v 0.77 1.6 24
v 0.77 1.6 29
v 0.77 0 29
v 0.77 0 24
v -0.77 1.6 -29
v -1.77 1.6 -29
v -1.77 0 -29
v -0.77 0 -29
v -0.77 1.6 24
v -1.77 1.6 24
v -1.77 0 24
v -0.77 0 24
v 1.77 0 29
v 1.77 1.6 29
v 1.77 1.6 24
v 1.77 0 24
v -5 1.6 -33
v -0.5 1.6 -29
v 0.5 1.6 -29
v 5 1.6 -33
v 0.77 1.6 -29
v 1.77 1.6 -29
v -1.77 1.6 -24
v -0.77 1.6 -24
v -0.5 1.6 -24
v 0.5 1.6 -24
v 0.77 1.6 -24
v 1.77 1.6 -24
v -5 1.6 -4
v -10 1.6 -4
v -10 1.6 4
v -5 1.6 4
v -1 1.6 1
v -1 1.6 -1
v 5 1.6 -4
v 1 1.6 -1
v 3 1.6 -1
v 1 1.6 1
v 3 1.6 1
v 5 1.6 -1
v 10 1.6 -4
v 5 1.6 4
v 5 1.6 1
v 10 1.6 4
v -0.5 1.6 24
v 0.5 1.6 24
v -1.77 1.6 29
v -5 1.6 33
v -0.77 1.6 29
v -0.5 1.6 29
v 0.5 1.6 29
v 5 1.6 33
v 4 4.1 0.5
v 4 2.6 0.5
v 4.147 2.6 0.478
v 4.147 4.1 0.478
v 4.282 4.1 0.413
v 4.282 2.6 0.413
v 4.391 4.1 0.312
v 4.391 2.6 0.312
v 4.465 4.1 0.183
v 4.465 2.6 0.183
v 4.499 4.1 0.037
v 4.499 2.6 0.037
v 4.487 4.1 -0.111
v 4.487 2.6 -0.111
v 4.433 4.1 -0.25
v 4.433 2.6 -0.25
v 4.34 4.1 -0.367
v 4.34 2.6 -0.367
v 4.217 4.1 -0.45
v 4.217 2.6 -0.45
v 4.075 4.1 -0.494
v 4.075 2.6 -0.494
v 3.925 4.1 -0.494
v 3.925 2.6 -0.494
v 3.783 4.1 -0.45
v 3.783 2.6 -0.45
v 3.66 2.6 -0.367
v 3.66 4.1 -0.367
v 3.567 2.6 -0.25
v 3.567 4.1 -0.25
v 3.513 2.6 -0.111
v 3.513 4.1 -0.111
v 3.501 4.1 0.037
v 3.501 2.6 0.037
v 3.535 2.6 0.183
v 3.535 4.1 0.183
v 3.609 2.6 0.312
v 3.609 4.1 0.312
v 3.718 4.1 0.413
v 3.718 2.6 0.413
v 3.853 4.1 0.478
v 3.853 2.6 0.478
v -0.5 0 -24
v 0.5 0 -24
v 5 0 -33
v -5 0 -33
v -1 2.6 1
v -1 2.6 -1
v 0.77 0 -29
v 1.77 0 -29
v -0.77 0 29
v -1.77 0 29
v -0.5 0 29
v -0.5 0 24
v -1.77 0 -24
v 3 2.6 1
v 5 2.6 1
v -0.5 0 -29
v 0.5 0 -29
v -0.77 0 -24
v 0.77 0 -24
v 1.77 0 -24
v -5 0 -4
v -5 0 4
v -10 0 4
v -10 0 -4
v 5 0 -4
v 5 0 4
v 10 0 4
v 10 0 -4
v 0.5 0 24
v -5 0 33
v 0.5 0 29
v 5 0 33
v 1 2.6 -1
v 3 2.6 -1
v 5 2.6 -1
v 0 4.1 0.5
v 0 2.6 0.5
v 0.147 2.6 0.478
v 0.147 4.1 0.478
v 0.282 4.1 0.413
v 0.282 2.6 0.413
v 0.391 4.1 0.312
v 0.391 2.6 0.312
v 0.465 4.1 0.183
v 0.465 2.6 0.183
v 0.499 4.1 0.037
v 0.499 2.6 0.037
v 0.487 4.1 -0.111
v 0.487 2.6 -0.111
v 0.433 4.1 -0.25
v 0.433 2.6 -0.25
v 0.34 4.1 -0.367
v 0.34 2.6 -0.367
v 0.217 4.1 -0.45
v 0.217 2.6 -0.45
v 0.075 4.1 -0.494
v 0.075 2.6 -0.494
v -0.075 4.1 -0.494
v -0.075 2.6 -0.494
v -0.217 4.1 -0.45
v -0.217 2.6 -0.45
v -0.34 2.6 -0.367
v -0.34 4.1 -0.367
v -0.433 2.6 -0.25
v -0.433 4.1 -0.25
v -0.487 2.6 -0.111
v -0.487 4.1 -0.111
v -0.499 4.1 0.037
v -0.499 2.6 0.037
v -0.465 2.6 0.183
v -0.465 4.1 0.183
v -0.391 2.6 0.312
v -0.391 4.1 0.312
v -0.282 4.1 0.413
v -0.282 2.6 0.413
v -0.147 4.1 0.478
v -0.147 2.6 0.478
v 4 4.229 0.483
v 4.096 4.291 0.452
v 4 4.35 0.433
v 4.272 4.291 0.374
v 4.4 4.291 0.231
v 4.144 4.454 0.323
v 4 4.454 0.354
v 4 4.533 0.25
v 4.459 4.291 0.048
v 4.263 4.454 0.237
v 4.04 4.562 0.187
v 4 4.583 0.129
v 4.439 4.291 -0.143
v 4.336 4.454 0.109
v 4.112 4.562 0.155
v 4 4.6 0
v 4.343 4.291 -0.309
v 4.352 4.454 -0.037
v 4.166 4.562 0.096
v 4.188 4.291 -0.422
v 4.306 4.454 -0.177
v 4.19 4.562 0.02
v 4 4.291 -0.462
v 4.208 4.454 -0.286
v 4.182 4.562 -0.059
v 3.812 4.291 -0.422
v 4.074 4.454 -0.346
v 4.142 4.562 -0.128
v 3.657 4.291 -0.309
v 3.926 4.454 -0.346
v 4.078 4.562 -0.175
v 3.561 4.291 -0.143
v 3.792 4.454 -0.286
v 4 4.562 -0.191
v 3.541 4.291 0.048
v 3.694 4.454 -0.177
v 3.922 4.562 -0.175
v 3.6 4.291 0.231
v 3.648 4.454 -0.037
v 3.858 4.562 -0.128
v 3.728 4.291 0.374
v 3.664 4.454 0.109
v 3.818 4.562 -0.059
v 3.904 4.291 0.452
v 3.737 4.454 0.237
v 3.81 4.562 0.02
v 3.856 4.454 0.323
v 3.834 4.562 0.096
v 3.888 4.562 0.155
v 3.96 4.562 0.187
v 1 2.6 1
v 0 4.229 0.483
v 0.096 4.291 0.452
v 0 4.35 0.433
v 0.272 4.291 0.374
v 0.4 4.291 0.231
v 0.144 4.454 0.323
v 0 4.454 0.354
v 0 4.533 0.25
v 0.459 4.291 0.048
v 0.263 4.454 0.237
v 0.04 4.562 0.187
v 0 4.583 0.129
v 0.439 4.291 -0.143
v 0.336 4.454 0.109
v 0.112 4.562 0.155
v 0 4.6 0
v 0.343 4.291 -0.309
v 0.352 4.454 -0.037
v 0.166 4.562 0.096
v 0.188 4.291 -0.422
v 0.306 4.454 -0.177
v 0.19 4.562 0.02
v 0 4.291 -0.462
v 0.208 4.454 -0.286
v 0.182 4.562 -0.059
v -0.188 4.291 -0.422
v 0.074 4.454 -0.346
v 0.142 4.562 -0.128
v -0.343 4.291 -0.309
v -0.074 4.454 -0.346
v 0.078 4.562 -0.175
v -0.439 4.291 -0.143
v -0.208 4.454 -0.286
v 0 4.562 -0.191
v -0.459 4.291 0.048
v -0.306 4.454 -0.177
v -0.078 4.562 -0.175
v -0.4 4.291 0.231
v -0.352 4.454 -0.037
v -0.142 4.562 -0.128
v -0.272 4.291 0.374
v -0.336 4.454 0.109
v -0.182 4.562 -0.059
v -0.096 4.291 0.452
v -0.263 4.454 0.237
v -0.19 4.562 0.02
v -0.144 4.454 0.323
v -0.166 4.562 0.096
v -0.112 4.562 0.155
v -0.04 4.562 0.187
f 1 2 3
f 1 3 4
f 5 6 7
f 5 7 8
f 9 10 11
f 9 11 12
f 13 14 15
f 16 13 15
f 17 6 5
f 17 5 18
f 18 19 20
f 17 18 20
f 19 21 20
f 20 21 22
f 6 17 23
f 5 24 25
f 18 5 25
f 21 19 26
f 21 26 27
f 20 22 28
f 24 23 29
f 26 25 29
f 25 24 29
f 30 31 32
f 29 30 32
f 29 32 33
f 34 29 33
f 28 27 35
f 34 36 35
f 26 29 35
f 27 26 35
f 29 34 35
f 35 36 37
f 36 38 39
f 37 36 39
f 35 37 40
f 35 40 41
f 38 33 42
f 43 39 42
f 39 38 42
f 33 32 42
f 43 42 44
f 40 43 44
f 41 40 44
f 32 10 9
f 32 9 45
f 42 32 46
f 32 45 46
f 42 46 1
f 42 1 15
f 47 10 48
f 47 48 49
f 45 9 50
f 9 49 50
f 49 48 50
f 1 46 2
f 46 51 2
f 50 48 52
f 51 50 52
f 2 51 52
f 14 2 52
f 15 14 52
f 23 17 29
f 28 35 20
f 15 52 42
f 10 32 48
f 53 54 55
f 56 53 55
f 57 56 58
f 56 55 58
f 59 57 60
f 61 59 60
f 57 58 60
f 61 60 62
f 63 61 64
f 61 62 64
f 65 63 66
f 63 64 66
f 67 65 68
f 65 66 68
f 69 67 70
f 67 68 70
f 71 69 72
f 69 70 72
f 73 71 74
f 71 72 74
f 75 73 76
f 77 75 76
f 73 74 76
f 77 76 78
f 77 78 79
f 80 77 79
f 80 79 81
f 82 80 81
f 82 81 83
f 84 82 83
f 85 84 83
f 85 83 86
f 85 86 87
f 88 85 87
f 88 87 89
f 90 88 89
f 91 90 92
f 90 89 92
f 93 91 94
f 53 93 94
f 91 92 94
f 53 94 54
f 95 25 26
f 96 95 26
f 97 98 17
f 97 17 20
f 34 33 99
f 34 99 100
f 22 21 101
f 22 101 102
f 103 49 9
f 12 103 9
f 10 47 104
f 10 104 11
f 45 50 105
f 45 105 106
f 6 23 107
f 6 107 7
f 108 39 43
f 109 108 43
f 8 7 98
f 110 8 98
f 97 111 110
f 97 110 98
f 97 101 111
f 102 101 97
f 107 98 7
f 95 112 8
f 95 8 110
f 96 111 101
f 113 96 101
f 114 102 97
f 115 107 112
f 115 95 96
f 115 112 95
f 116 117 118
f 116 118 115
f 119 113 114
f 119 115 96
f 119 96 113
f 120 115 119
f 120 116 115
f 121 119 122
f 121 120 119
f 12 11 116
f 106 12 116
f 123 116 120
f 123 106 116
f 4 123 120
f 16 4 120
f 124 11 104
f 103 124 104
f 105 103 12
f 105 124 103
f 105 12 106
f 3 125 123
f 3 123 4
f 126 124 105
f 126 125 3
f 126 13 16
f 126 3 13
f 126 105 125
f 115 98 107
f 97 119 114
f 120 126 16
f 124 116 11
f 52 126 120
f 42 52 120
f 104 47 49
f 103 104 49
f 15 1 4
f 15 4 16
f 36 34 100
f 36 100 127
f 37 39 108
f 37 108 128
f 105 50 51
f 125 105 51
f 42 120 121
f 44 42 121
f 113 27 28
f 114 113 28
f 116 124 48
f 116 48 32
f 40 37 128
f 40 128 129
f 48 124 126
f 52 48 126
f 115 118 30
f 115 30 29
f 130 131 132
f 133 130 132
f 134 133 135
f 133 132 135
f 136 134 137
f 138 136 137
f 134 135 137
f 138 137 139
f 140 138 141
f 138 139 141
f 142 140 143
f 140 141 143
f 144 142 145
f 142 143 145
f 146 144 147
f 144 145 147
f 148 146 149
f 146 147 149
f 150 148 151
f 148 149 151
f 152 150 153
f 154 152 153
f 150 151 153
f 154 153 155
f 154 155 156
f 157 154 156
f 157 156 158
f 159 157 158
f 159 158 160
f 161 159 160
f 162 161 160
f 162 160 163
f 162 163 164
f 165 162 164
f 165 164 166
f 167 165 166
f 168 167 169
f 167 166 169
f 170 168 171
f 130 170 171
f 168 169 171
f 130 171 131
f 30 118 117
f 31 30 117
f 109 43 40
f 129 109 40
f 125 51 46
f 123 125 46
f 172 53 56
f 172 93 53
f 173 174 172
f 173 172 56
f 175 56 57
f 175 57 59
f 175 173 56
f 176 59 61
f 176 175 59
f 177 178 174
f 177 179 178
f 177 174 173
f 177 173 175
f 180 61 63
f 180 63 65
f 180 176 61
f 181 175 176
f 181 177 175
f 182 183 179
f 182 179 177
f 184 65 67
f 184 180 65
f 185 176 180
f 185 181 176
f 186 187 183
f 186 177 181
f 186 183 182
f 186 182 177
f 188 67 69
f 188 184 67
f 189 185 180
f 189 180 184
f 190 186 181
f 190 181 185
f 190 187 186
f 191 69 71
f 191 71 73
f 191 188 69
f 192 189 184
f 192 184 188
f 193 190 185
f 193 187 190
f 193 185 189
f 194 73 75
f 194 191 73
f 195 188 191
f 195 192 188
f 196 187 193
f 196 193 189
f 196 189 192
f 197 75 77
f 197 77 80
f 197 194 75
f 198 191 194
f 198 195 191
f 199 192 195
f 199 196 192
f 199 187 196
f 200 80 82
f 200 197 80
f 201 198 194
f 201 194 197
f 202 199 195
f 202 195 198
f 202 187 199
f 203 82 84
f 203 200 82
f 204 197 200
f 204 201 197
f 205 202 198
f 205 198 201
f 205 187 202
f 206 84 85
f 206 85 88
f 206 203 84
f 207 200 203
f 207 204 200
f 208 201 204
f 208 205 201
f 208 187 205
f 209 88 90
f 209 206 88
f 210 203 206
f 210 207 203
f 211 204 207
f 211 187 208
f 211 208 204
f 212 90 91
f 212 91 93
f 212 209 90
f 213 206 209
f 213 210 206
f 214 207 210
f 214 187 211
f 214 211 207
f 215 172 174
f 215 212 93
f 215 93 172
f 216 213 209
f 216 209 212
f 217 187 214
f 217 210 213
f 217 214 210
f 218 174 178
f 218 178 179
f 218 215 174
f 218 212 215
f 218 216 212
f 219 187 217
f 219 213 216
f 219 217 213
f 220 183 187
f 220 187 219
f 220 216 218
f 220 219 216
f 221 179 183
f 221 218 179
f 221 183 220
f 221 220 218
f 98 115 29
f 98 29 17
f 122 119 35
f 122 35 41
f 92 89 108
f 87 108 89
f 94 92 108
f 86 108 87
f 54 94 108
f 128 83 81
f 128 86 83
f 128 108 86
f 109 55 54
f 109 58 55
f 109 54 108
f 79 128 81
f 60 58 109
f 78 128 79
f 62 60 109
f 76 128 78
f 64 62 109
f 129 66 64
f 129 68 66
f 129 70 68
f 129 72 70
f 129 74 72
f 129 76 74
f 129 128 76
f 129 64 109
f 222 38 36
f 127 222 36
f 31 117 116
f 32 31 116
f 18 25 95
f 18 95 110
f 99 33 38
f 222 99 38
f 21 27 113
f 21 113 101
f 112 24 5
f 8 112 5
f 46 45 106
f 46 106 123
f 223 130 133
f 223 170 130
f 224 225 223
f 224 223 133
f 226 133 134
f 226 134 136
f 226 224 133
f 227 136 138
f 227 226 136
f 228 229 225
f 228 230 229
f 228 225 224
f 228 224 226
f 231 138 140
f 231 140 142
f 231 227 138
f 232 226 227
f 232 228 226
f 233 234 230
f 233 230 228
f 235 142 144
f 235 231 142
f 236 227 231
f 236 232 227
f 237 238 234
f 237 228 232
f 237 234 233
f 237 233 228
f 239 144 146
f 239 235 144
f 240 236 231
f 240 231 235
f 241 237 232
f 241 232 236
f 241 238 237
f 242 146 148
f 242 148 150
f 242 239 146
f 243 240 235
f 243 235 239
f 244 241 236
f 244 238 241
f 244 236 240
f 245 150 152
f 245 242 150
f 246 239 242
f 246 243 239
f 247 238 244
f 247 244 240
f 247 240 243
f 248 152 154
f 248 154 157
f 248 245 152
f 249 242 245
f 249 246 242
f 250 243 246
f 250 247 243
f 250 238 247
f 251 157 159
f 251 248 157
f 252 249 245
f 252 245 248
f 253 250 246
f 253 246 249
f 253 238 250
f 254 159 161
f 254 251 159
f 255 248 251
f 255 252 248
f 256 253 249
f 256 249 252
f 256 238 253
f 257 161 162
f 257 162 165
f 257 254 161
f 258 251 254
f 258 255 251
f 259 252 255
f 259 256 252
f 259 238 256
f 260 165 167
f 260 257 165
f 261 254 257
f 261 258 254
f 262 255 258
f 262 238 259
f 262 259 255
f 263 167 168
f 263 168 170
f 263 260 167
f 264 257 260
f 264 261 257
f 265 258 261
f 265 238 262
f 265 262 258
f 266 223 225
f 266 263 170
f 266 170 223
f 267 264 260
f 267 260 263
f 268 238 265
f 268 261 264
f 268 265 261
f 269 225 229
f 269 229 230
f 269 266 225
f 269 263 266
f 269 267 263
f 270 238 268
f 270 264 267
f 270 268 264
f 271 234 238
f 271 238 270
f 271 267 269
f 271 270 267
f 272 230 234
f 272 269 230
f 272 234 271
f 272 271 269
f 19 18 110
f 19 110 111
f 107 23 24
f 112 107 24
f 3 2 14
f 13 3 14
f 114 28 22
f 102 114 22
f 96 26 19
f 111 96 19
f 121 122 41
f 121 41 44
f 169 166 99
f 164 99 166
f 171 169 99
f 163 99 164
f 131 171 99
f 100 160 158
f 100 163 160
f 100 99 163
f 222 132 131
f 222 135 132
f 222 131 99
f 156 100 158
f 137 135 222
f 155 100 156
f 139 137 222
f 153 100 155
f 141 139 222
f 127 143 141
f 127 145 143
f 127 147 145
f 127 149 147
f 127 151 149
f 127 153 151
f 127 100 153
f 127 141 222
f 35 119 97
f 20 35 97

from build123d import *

# Parameters (mm, degrees)
SKETCH2_W           = 10
SKETCH2_H           = 66
BOSS_EXTRUDE1_DEPTH = 1.6
CUT_EXTRUDE1_REACH  = 35.415
SKETCH3_W           = 1
SKETCH3_H           = 5
SKETCH4_W           = 20
SKETCH4_H           = 8
BOSS_EXTRUDE2_DEPTH = 1.6
SKETCH5_W           = 2
SKETCH5_H           = 2
BOSS_EXTRUDE3_DEPTH = 1
SKETCH6_R           = 0.5
BOSS_EXTRUDE4_DEPTH = 2
FILLET1_R           = 0.5


with BuildPart() as part:
    # Sketch2 → Boss-Extrude1 (new body)
    with BuildSketch(Plane(origin=(0, 0, 0), x_dir=(1, 0, 0), z_dir=(0, 1, 0))):
        Rectangle(SKETCH2_W, SKETCH2_H)
    extrude(amount=BOSS_EXTRUDE1_DEPTH)

    # Sketch3 → Cut-Extrude1 (cut, up to next)
    with BuildSketch(Plane(origin=(0, 1.6, 0), x_dir=(1, 0, 0), z_dir=(0, 1, 0)), mode=Mode.PRIVATE) as cut_extrude1_sk1:
        with Locations((1.27, 26.5)):
            Rectangle(SKETCH3_W, SKETCH3_H)
    cut_extrude1_tool1 = extrude(cut_extrude1_sk1.sketch, amount=-CUT_EXTRUDE1_REACH, mode=Mode.PRIVATE) & part.part
    # Sketch3 → Cut-Extrude1 (cut, up to next)
    with BuildSketch(Plane(origin=(0, 1.6, 0), x_dir=(1, 0, 0), z_dir=(0, 1, 0)), mode=Mode.PRIVATE) as cut_extrude1_sk2:
        with Locations((0, 26.5)):
            Rectangle(SKETCH3_W, SKETCH3_H)
    cut_extrude1_tool2 = extrude(cut_extrude1_sk2.sketch, amount=-CUT_EXTRUDE1_REACH, mode=Mode.PRIVATE) & part.part
    # Sketch3 → Cut-Extrude1 (cut, up to next)
    with BuildSketch(Plane(origin=(0, 1.6, 0), x_dir=(1, 0, 0), z_dir=(0, 1, 0)), mode=Mode.PRIVATE) as cut_extrude1_sk3:
        with Locations((-1.27, 26.5)):
            Rectangle(SKETCH3_W, SKETCH3_H)
    cut_extrude1_tool3 = extrude(cut_extrude1_sk3.sketch, amount=-CUT_EXTRUDE1_REACH, mode=Mode.PRIVATE) & part.part
    # Sketch3 → Cut-Extrude1 (cut, up to next)
    with BuildSketch(Plane(origin=(0, 1.6, 0), x_dir=(1, 0, 0), z_dir=(0, 1, 0)), mode=Mode.PRIVATE) as cut_extrude1_sk4:
        with Locations((-1.27, -26.5)):
            Rectangle(SKETCH3_W, SKETCH3_H)
    cut_extrude1_tool4 = extrude(cut_extrude1_sk4.sketch, amount=-CUT_EXTRUDE1_REACH, mode=Mode.PRIVATE) & part.part
    # Sketch3 → Cut-Extrude1 (cut, up to next)
    with BuildSketch(Plane(origin=(0, 1.6, 0), x_dir=(1, 0, 0), z_dir=(0, 1, 0)), mode=Mode.PRIVATE) as cut_extrude1_sk5:
        with Locations((1.27, -26.5)):
            Rectangle(SKETCH3_W, SKETCH3_H)
    cut_extrude1_tool5 = extrude(cut_extrude1_sk5.sketch, amount=-CUT_EXTRUDE1_REACH, mode=Mode.PRIVATE) & part.part
    # Sketch3 → Cut-Extrude1 (cut, up to next)
    with BuildSketch(Plane(origin=(0, 1.6, 0), x_dir=(1, 0, 0), z_dir=(0, 1, 0)), mode=Mode.PRIVATE) as cut_extrude1_sk6:
        with Locations((0, -26.5)):
            Rectangle(SKETCH3_W, SKETCH3_H)
    cut_extrude1_tool6 = extrude(cut_extrude1_sk6.sketch, amount=-CUT_EXTRUDE1_REACH, mode=Mode.PRIVATE) & part.part
    add(cut_extrude1_tool1.solids().sort_by_distance((1.27, 1.6, -26.5))[0], mode=Mode.SUBTRACT)
    add(cut_extrude1_tool2.solids().sort_by_distance((0, 1.6, -26.5))[0], mode=Mode.SUBTRACT)
    add(cut_extrude1_tool3.solids().sort_by_distance((-1.27, 1.6, -26.5))[0], mode=Mode.SUBTRACT)
    add(cut_extrude1_tool4.solids().sort_by_distance((-1.27, 1.6, 26.5))[0], mode=Mode.SUBTRACT)
    add(cut_extrude1_tool5.solids().sort_by_distance((1.27, 1.6, 26.5))[0], mode=Mode.SUBTRACT)
    add(cut_extrude1_tool6.solids().sort_by_distance((0, 1.6, 26.5))[0], mode=Mode.SUBTRACT)

    # Sketch4 → Boss-Extrude2 (add)
    with BuildSketch(Plane.XZ):
        Rectangle(SKETCH4_W, SKETCH4_H)
    extrude(amount=-BOSS_EXTRUDE2_DEPTH)

    # Sketch5 → Boss-Extrude3 (add)
    with BuildSketch(Plane(origin=(0, 1.6, 0), x_dir=(1, 0, 0), z_dir=(0, 1, 0))):
        Rectangle(SKETCH5_W, SKETCH5_H)
        with Locations((4, 0)):
            Rectangle(SKETCH5_W, SKETCH5_H)
    extrude(amount=BOSS_EXTRUDE3_DEPTH)

    # Sketch6 → Boss-Extrude4 (add)
    with BuildSketch(Plane(origin=(0, 2.6, 0), x_dir=(1, 0, 0), z_dir=(0, 1, 0))):
        with Locations(Location((0, 0, 0), (0, 0, 270))):
            Circle(SKETCH6_R)
        with Locations(Location((4, 0, 0), (0, 0, 270))):
            Circle(SKETCH6_R)
    extrude(amount=BOSS_EXTRUDE4_DEPTH)

    # Fillet1
    fillet1_edges = [part.edges().sort_by_distance(p)[0] for p in [
        (0, 4.6, -0.5),
        (4, 4.6, -0.5),
    ]]
    fillet(fillet1_edges, radius=FILLET1_R)


solid = part.part
